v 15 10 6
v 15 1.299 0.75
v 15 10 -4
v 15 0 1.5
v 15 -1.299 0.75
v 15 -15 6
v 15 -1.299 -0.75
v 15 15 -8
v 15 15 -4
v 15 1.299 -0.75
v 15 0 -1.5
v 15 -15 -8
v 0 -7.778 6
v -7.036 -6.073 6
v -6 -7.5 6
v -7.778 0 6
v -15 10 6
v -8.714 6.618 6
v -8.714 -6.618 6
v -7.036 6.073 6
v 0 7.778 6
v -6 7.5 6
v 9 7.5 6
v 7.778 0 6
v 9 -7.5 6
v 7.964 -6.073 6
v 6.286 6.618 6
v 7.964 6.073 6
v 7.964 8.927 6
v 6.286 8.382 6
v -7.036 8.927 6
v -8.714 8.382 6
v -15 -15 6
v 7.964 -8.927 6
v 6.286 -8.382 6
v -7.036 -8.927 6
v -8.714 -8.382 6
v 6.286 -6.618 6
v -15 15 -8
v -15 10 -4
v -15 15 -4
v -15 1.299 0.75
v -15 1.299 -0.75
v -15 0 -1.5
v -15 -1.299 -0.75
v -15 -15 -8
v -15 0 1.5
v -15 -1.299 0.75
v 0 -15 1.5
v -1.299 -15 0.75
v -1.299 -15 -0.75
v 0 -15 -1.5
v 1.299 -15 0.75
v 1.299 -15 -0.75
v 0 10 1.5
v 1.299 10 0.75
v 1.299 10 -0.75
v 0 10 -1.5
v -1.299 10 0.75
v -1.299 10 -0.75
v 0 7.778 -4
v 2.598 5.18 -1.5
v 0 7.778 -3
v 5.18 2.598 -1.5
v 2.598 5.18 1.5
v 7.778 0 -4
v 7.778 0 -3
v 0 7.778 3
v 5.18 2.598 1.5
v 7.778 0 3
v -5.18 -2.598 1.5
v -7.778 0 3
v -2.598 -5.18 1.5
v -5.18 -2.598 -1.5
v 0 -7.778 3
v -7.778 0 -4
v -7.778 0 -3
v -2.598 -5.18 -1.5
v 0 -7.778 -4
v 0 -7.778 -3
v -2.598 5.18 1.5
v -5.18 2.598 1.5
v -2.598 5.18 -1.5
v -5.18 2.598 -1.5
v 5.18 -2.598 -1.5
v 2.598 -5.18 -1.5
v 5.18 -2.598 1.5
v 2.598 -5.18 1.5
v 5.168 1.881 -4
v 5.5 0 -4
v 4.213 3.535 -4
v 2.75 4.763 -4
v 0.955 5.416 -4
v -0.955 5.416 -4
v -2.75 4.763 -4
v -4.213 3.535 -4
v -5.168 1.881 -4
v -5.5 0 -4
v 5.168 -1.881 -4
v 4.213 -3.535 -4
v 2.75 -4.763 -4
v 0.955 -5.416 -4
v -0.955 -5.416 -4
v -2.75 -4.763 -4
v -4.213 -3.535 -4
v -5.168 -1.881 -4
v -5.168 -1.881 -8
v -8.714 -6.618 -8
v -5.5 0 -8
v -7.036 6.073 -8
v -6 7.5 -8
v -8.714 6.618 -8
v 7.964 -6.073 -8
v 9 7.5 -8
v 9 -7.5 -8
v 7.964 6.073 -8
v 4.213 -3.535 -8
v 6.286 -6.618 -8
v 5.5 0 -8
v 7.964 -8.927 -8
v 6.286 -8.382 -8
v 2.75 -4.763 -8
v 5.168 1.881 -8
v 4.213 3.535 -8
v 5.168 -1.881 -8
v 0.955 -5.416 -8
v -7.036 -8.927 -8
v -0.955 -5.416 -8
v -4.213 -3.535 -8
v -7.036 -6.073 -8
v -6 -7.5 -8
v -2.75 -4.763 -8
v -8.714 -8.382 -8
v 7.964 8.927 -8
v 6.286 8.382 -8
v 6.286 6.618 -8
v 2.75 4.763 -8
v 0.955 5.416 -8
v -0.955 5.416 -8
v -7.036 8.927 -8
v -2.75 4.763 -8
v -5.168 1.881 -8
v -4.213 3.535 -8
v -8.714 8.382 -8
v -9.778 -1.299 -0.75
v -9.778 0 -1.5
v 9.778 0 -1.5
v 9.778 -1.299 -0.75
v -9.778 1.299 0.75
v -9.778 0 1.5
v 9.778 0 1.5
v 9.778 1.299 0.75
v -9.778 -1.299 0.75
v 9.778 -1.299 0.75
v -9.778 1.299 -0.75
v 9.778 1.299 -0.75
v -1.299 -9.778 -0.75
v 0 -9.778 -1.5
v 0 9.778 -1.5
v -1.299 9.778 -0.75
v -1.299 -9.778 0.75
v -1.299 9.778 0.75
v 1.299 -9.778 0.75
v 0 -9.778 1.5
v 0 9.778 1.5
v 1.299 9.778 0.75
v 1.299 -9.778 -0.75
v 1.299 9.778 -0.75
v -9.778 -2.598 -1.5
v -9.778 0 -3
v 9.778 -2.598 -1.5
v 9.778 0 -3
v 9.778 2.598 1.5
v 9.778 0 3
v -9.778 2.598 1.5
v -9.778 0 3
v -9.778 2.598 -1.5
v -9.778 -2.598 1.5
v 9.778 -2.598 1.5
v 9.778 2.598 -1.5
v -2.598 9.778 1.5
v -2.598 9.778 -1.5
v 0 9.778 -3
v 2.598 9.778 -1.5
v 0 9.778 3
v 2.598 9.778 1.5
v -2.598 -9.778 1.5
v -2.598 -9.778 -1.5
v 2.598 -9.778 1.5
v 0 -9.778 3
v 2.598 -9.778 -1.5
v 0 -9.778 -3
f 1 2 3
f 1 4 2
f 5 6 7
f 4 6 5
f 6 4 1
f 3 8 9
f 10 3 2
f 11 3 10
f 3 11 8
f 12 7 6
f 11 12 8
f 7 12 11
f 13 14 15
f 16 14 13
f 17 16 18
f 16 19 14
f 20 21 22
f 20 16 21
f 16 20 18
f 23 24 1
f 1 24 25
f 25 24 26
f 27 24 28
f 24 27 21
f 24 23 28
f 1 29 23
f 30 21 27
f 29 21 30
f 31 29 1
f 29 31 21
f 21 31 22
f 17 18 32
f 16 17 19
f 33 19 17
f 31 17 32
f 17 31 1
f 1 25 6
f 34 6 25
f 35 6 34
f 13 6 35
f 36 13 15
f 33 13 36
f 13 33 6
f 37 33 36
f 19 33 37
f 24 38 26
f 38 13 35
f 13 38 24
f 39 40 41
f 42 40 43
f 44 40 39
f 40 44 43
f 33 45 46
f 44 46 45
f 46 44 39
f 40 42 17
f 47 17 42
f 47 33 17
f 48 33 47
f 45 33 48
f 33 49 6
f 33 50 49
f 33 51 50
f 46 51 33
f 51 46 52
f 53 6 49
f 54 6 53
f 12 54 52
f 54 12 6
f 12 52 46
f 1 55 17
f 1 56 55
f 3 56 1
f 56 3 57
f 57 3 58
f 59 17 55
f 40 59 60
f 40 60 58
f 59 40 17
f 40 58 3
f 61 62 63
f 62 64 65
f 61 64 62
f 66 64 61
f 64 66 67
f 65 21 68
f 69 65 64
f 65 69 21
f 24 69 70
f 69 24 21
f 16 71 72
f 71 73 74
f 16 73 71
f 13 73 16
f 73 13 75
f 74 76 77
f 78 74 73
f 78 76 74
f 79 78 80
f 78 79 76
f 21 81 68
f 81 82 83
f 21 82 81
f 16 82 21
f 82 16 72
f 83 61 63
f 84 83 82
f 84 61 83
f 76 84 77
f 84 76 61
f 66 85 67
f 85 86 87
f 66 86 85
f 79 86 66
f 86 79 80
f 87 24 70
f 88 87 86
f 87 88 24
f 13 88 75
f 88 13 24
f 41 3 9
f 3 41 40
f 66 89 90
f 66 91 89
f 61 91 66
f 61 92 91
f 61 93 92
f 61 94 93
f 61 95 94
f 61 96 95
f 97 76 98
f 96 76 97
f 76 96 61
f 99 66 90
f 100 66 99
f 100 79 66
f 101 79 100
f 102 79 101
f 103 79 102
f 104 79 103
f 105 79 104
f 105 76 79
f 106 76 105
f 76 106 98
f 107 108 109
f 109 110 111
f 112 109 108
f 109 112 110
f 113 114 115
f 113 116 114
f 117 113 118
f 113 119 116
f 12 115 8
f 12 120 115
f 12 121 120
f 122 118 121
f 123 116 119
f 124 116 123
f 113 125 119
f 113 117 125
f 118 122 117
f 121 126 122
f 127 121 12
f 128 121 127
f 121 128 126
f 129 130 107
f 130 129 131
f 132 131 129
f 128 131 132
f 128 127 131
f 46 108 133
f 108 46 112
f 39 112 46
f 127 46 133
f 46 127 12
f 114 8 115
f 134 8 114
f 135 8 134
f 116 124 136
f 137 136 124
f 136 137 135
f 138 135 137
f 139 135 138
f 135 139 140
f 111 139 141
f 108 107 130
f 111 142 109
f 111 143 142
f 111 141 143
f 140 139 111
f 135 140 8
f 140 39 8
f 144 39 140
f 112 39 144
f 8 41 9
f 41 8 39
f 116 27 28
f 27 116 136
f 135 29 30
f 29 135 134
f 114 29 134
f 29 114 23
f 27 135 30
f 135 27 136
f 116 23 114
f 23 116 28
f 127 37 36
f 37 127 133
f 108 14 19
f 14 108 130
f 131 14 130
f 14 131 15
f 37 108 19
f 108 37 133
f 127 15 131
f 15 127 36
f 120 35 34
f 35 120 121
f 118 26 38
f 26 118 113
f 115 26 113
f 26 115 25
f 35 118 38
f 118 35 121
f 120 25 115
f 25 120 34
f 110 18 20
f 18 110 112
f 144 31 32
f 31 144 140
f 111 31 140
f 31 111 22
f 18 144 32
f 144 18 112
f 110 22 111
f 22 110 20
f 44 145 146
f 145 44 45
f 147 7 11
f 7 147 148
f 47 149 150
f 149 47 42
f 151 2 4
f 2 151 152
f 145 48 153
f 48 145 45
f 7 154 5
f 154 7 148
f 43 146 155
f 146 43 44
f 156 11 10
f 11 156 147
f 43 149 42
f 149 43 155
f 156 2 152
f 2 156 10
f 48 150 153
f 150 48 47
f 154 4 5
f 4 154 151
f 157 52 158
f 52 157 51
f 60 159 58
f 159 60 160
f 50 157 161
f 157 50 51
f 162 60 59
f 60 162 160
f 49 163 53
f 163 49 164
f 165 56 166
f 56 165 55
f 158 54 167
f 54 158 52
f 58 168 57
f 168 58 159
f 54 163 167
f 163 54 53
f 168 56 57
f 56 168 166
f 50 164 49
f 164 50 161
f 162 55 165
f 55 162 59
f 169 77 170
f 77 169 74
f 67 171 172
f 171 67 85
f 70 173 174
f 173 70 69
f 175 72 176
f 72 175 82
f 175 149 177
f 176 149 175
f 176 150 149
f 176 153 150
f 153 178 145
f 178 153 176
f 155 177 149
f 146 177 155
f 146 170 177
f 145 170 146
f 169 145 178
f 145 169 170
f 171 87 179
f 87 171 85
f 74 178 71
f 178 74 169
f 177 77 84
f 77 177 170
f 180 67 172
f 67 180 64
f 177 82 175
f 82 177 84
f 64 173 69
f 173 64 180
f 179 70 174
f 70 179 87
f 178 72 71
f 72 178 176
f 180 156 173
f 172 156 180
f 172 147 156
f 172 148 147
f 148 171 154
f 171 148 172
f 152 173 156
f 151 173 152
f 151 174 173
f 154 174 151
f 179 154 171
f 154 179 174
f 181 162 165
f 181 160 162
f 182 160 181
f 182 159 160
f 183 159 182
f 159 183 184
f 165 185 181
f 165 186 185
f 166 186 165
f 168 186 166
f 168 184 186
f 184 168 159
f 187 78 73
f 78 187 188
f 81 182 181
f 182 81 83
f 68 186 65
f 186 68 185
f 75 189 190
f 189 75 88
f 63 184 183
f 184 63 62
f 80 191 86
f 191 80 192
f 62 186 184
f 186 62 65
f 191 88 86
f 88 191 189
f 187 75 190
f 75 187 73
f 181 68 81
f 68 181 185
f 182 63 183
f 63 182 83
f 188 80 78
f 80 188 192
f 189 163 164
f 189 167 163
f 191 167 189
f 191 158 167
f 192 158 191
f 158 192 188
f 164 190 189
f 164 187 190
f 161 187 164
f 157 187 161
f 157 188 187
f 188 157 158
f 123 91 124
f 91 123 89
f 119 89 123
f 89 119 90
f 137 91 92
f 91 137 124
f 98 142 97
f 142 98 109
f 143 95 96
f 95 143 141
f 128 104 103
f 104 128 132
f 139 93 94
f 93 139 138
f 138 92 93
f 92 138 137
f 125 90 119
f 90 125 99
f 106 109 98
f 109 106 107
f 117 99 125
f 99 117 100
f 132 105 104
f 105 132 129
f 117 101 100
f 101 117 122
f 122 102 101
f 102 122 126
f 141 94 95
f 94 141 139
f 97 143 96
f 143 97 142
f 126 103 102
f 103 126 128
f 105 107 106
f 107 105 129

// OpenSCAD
outer = 30;
inner = 11;
height = 12;
drill=3;

indiag = sqrt(2*inner*inner);

difference() {
union() {
difference() {
cube([outer,outer,height],center=true);
translate([0,outer-5,0]) cube([outer,outer,height],center=true);

rotate([0,0,45]) cube([inner,inner,height],center=true);
}
translate([0,0,-height/2]) cube([outer,outer,4],center=true);
}
translate([7.5,7.5,0]) cylinder(height*2,drill/2,drill/2,center=true);
translate([-7.5,-7.5,0]) cylinder(height*2,drill/2,drill/2,center=true);
translate([7.5,-7.5,0]) cylinder(height*2,drill/2,drill/2,center=true);
translate([-7.5,7.5,0]) cylinder(height*2,drill/2,drill/2,center=true);

translate([0,0,0]) rotate([0,90,0]) cylinder(outer*2,drill/2,drill/2,center=true,$fn=6);
translate([0,0,0]) rotate([90,90,0]) cylinder(outer*2,drill/2,drill/2,center=true,$fn=6);
translate([0,0,0]) rotate([0,90,0]) cylinder(indiag+4,drill,drill,center=true, $fn=6);
translate([0,0,0]) rotate([90,90,0]) cylinder(indiag+4,drill,drill,center=true, $fn=6);
translate([0,0,-outer]) cylinder(outer*4,inner/2,inner/2,center=true);

}
